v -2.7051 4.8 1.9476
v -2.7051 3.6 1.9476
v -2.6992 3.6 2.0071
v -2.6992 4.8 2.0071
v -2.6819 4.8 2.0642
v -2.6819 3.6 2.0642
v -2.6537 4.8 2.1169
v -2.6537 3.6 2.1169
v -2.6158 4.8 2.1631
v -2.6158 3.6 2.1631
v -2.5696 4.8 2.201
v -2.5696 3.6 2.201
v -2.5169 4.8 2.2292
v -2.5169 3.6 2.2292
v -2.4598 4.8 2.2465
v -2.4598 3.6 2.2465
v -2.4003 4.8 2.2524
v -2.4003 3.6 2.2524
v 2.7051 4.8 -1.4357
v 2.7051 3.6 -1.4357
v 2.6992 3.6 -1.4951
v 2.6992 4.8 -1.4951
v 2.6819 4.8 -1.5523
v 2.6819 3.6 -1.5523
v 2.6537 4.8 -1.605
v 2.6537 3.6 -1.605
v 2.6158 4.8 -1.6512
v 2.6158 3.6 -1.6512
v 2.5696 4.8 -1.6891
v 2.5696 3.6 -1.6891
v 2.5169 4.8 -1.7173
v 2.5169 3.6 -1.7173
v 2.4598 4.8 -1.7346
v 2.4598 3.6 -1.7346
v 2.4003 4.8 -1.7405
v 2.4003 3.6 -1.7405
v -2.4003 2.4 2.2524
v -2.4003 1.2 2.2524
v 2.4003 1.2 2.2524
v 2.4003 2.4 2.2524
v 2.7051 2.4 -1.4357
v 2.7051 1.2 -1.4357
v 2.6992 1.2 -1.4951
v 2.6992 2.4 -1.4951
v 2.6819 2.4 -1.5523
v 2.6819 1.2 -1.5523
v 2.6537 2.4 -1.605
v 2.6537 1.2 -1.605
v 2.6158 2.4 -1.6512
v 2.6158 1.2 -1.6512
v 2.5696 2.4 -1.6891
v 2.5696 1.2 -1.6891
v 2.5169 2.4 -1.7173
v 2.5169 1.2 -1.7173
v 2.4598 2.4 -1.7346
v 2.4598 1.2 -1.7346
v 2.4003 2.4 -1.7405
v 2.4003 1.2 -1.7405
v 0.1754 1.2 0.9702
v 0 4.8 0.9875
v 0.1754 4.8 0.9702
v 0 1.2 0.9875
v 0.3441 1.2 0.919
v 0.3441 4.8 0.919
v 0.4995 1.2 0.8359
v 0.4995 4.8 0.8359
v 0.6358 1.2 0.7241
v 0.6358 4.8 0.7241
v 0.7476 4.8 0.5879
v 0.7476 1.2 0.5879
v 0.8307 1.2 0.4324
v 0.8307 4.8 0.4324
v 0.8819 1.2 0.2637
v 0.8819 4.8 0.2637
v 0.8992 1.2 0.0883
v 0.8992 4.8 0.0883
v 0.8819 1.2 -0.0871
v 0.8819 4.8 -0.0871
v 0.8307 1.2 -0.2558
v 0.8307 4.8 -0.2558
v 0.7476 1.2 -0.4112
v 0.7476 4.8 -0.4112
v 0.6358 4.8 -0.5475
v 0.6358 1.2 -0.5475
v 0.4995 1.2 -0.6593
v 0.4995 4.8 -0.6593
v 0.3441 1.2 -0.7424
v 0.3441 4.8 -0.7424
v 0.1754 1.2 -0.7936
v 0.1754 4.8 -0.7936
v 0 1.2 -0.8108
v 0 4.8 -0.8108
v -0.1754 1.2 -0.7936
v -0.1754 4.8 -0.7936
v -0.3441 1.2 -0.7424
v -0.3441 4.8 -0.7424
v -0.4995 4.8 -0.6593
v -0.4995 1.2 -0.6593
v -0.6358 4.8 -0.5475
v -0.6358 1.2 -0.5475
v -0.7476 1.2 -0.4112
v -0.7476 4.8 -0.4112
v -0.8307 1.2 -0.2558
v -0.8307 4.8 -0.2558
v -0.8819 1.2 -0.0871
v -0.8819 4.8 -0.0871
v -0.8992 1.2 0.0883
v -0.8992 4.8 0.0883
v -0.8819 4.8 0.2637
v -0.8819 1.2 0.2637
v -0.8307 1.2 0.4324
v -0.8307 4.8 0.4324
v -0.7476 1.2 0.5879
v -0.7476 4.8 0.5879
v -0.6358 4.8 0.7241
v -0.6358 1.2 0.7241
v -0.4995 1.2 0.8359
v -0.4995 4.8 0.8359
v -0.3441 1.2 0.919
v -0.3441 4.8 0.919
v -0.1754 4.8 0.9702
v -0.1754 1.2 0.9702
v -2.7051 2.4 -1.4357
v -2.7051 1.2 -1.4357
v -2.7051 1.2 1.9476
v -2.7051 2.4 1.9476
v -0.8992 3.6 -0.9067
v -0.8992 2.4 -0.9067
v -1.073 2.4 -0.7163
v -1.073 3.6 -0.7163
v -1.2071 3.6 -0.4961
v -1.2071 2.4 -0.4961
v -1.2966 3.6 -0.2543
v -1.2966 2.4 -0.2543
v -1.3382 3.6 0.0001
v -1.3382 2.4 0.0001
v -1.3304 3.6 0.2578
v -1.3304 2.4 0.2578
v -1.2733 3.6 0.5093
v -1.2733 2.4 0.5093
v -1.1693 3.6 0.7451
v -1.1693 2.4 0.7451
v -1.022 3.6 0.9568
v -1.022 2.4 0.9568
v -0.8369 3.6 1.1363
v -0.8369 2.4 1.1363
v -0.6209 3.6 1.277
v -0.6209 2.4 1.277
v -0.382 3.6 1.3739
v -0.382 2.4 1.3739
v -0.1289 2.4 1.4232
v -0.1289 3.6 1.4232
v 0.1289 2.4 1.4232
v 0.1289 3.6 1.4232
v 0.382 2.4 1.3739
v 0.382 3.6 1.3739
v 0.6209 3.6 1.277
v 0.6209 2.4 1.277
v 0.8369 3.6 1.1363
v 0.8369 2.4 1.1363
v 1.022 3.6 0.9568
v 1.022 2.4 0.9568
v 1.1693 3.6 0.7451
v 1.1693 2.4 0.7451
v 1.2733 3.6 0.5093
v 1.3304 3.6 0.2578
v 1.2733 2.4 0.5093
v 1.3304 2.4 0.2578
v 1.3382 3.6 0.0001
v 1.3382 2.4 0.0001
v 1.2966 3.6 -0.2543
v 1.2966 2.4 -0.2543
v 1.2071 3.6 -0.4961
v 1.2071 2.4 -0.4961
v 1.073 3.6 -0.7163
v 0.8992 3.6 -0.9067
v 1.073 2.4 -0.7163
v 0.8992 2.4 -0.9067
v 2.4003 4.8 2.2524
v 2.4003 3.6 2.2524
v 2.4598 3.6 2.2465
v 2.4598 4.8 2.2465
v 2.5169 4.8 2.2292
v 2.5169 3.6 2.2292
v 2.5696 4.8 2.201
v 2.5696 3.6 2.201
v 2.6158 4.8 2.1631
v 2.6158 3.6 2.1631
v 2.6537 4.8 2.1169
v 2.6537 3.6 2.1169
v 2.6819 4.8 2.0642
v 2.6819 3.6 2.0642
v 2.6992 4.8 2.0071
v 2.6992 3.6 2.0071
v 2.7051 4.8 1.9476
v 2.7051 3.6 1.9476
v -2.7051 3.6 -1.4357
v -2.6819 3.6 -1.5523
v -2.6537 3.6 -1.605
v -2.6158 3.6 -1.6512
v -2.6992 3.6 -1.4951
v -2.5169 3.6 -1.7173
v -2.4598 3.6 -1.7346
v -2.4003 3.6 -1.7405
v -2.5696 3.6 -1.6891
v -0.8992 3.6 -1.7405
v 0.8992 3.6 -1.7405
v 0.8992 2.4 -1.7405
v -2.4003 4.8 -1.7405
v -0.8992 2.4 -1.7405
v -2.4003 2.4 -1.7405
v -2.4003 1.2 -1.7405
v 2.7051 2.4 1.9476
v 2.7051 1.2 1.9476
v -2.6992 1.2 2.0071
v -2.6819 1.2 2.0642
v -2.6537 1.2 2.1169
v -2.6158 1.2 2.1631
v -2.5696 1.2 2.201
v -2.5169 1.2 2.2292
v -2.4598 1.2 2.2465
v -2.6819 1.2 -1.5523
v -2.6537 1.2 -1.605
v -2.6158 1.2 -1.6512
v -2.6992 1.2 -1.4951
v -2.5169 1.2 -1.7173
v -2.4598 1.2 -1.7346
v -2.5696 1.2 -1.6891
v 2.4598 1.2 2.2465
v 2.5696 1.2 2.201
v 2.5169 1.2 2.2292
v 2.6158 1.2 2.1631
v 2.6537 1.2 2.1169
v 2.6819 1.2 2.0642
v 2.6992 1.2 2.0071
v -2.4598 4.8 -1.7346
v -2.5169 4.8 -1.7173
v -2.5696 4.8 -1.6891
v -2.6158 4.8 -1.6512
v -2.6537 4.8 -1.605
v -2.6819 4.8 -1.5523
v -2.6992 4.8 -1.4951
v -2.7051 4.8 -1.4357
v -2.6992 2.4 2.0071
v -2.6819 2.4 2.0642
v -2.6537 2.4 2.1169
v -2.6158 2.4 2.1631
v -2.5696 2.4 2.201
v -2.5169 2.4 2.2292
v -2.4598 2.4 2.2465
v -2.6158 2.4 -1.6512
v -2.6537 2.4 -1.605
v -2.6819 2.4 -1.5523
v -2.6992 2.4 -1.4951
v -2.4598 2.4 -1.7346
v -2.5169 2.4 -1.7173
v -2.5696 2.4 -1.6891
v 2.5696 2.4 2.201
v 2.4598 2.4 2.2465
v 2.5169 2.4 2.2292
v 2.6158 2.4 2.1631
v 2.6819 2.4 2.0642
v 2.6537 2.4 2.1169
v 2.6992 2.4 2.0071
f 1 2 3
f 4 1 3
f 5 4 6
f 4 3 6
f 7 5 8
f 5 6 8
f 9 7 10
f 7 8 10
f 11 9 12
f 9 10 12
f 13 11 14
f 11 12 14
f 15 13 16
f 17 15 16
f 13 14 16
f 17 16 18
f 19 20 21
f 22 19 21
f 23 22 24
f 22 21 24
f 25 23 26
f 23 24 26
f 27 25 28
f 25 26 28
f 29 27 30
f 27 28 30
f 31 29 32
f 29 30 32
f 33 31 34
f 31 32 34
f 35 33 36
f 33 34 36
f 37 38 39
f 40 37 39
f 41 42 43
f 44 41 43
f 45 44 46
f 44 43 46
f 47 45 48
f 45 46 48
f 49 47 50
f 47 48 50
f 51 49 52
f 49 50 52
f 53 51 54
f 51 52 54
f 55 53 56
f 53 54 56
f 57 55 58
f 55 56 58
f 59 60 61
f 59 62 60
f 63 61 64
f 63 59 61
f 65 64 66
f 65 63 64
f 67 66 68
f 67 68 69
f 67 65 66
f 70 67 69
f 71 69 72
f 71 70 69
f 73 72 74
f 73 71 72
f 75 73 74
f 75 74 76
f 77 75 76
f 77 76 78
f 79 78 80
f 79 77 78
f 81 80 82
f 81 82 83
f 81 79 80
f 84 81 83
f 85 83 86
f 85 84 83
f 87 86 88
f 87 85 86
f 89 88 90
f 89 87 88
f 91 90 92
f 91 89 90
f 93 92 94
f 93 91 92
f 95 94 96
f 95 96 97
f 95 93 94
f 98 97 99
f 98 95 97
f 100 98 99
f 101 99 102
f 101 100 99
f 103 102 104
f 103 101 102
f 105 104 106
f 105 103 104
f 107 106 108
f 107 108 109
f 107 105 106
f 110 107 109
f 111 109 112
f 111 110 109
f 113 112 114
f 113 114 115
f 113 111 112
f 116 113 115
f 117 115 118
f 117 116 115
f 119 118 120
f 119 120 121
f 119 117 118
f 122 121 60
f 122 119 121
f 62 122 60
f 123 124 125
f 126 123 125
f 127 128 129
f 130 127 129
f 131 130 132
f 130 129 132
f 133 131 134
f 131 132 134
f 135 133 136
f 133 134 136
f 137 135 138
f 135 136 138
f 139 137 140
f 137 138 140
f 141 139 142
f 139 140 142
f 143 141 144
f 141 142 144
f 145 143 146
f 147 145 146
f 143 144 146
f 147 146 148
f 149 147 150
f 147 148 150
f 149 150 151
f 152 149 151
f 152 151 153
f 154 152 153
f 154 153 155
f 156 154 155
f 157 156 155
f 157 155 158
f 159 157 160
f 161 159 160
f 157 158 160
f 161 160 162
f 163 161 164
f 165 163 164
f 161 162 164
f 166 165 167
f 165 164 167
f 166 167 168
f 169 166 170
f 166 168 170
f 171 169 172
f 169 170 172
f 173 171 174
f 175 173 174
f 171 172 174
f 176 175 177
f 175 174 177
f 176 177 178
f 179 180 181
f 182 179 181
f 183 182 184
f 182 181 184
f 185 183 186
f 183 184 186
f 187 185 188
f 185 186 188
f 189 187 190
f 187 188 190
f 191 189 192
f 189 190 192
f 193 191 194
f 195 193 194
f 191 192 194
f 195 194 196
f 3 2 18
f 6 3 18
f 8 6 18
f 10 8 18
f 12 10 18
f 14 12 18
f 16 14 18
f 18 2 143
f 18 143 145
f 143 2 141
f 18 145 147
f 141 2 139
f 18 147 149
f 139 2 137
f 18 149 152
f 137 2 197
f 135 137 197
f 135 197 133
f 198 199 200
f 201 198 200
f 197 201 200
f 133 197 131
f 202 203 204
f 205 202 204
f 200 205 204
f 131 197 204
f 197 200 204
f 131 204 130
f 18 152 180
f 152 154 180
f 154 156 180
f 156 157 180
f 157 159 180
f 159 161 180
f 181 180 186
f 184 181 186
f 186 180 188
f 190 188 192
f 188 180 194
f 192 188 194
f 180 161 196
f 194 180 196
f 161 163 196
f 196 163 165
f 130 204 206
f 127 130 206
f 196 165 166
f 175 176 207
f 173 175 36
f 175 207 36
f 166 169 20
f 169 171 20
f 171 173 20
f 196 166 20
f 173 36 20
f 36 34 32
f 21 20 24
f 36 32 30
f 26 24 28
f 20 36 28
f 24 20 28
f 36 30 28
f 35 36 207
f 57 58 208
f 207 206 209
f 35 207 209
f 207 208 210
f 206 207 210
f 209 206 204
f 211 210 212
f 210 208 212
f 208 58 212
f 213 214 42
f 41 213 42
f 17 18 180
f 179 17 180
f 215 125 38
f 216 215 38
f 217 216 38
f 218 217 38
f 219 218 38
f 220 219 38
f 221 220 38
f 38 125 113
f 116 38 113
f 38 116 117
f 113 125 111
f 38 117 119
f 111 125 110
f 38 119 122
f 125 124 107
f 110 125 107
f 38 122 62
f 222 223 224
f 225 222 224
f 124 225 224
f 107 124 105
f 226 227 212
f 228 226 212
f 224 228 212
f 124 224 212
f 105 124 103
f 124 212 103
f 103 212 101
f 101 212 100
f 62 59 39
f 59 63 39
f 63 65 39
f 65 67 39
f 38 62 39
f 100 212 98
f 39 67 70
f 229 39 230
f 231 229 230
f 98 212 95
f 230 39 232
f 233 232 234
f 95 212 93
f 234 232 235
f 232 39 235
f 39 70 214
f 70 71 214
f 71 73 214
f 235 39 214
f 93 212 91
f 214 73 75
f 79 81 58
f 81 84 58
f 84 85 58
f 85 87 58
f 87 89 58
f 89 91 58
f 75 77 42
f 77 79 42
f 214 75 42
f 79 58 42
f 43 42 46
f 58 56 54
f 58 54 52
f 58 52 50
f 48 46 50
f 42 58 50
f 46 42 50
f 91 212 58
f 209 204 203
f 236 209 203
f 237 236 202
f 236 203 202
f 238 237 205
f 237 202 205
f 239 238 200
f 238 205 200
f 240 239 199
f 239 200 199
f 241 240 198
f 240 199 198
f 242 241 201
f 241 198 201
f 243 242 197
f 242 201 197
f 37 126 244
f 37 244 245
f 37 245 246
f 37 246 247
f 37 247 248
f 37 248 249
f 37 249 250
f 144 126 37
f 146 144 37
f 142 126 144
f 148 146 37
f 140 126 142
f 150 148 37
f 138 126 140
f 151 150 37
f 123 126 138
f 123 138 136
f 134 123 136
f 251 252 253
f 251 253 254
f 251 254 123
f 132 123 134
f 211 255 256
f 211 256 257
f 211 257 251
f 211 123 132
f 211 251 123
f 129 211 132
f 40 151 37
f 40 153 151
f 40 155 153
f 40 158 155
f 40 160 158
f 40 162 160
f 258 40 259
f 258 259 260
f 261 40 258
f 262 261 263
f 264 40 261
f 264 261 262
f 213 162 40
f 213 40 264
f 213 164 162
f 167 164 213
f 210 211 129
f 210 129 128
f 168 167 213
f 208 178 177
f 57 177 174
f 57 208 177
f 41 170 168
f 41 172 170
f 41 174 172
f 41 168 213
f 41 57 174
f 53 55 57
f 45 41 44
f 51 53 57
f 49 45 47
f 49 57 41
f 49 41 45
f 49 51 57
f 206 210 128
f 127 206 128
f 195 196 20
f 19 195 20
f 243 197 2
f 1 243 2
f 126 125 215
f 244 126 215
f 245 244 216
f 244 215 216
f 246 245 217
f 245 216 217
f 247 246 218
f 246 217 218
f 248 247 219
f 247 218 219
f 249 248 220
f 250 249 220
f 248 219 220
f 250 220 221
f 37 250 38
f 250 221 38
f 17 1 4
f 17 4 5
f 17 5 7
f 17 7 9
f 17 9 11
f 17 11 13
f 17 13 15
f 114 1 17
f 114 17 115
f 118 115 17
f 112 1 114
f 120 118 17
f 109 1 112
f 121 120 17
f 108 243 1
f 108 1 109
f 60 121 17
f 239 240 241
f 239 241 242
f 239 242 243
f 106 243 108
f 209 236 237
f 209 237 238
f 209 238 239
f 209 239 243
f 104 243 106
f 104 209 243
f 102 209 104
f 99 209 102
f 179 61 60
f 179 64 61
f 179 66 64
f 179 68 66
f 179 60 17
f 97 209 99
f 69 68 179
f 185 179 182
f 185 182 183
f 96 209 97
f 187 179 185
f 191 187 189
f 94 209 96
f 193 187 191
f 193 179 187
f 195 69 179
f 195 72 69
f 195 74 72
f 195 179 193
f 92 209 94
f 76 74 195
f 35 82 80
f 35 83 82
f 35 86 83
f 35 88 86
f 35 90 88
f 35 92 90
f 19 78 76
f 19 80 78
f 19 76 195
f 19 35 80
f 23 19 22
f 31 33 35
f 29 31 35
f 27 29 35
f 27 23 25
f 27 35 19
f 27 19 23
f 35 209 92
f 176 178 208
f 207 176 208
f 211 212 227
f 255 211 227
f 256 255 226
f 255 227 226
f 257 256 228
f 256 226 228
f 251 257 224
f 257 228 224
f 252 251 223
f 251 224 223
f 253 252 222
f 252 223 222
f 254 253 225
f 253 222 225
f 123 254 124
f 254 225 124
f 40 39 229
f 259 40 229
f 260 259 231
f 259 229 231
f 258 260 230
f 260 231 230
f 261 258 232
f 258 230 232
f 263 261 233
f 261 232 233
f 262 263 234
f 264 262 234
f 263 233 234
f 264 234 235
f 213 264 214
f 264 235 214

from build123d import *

# Parameters (mm, degrees)
SKETCH1_R           = 1.4986
BOSS_EXTRUDE1_DEPTH = 2
SKETCH2_R           = 1.4986
BOSS_EXTRUDE2_DEPTH = 2
SKETCH3_R           = 1.4986
BOSS_EXTRUDE3_DEPTH = 2
SCALE1_SCALE        = 0.6


with BuildPart() as part:
    # Sketch1 → Boss-Extrude1 (new body)
    with BuildSketch(Plane(origin=(0, 0, 0), x_dir=(1, 0, 0), z_dir=(0, 1, 0))):
        with BuildLine():
            Line((-4.5085, 2.54), (-4.5085, -3.0988))
            ThreePointArc((-4.5085, -3.0988), (-4.359710245, -3.458010245), (-4.0005, -3.6068))
            Line((-4.0005, -3.6068), (4.0005, -3.6068))
            ThreePointArc((4.0005, -3.6068), (4.359710245, -3.458010245), (4.5085, -3.0988))
            Line((4.5085, -3.0988), (4.5085, 2.54))
            ThreePointArc((4.5085, 2.54), (4.359710245, 2.899210245), (4.0005, 3.048))
            Line((4.0005, 3.048), (-4.0005, 3.048))
            ThreePointArc((-4.0005, 3.048), (-4.359710245, 2.899210245), (-4.5085, 2.54))
        make_face()
        with Locations(Location((0, 0, 0), (0, 0, 270))):
            Circle(SKETCH1_R, mode=Mode.SUBTRACT)
    extrude(amount=BOSS_EXTRUDE1_DEPTH)

    # Sketch2 → Boss-Extrude2 (add)
    with BuildSketch(Plane(origin=(0, 2, 0), x_dir=(1, 0, 0), z_dir=(0, 1, 0))):
        with BuildLine():
            Line((1.4986, 1.658407996), (1.4986, 3.048))
            Line((1.4986, 3.048), (-1.4986, 3.048))
            Line((-1.4986, 3.048), (-1.4986, 1.658407996))
            ThreePointArc((-1.4986, 1.658407996), (0, -2.2352), (1.4986, 1.658407996))
        make_face()
        with Locations(Location((0, 0, 0), (0, 0, 270))):
            Circle(SKETCH2_R, mode=Mode.SUBTRACT)
    extrude(amount=BOSS_EXTRUDE2_DEPTH)

    # Sketch3 → Boss-Extrude3 (add)
    with BuildSketch(Plane(origin=(0, 4, 0), x_dir=(1, 0, 0), z_dir=(0, 1, 0))):
        with BuildLine():
            Line((-4.5085, 2.54), (-4.5085, -3.0988))
            ThreePointArc((-4.5085, -3.0988), (-4.359710245, -3.458010245), (-4.0005, -3.6068))
            Line((-4.0005, -3.6068), (4.0005, -3.6068))
            ThreePointArc((4.0005, -3.6068), (4.359710245, -3.458010245), (4.5085, -3.0988))
            Line((4.5085, -3.0988), (4.5085, 2.54))
            ThreePointArc((4.5085, 2.54), (4.359710245, 2.899210245), (4.0005, 3.048))
            Line((4.0005, 3.048), (-4.0005, 3.048))
            ThreePointArc((-4.0005, 3.048), (-4.359710245, 2.899210245), (-4.5085, 2.54))
        make_face()
        with Locations(Location((0, 0, 0), (0, 0, 270))):
            Circle(SKETCH3_R, mode=Mode.SUBTRACT)
    extrude(amount=BOSS_EXTRUDE3_DEPTH)


with BuildPart() as part_1:
    # Scale1: scaled about (0, 3, 0.220798143)
    add(part.part.scale(SCALE1_SCALE).moved(Location((0, 1.2, 0.088319257))))


solid = part_1.part
